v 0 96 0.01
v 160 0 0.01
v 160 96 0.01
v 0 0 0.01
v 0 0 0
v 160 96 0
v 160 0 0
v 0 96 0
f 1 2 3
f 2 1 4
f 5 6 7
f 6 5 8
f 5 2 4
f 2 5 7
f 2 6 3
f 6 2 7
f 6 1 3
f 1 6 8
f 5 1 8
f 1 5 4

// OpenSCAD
// file: ../common/library_function.scad
// 라이브러리, 검증된 것만 이곳에
use <MCAD/boxes.scad>
include	<constants.scad>

// 적정한 fn 값
function fnRound(radious) = $preview ? FN : floor(2 * PI * radious / 0.4) - floor(2 * PI * radious / 0.4) % 4;
//function fnRound(radious) = 2 * PI * radious / 0.4;

// z축 0로로
function set_z(v, z) = [v.x, v.y, z];

// 벡터 회전 계산
function rotate_vector(angle, vector) = rotatez_vector(angle[2], rotatey_vector(angle[1], rotatex_vector(angle[0], vector)));
// x축 기준 회전 벡터 회전 계산
function rotatex_vector(anglex, vector) = [
	vector[0],
	-vector[2] * sin(anglex) + vector[1] * cos(anglex),
	vector[2] * cos(anglex) + vector[1] * sin(anglex)
];
// y축 기준 회전 벡터 회전 계산
function rotatey_vector(angley, vector) = [
	vector[0] * cos(angley) + vector[2] * sin(angley),
	vector[1],
	-vector[0] * sin(angley) + vector[2] * cos(angley)
];

// z축 기준 회전 벡터 회전 계산
function rotatez_vector(anglez, vector) = [
	-vector[1] * sin(anglez) + vector[0] * cos(anglez),
	vector[1] * cos(anglez) + vector[0] * sin(anglez),
	vector[2]
];

//	숫자, 소수점 이하 몇자리
function strfix(number, count) =
	chr([for (cx = [0:
		len(search(".", str(number))) == 0
			? len(str(number)) - 1
			: (search(".", str(number))[0] + count) >= len(str(number))
				? len(str(number)) - 1
				: (search(".", str(number))[0] + count)
	]) ord(str(number)[cx])])
;

//	육면체에서 꼭지점들을 벡터로
function	vectors_from_cube(size) = [
	[0,			0,		0],
	[size.x,	0,		0],
	[size.x,	size.y,	0],
	[0,			size.y,	0],

	[0,			0,		size.z],
	[size.x,	0,		size.z],
	[size.x,	size.y,	size.z],
	[0,			size.y,	size.z]
];
// file: collect-default.scad
//use <part-01.scad>	// 화소가 있는 영역, activeArea
//use <part-02.scad>	//	주요 화면 부품. Display Panel, displayPanel
//use <part-03.scad>	//	디스플레이 패널에 붙어있는 커넥터, displayConnector
//use <part-04.scad>	//	패널 밑에 받치는 밑판
//use <part-05.scad>	//	디스플레이 패널을 덮는 위판, upperPanel
//use <part-06.scad>	//	waveshare epaper 7.3인치 제품. 그룹 of part1, part2, part3
//use <part-10.scad>	//	연결 부속들만 네 귀퉁이에 위치시킨 것
//use <part-13.scad>

//	DEFAULT값을 모아, 모아서
DEFAULT_COLLECTED = [
	// part01, 화소가 있는 영역, activeArea
	["active.area",								"화소가 있는 영역, activeArea"],
	["active.area.size",	[160.00, 96.00],	"크기, 화소가 있는 영역, sizeActiveArea"],

	//	part02, 주요 화면 부품. Display Panel, displayPanel
	["display.panel",								"주요 화면 부품. Display Panel, displayPanel"],
	["display.panel.size",	[170.20, 111.20, 0.91],	"크기, 화면 부품의 크기, sizeDisplayPanel"],
	["active.area.margin",	[5.10, 4.70],			"여백, 화소가 있는 영역, marginActiveArea"],

	//	디스플레이 패널에 붙어있는 커넥터, displayConnector, part03
	["display.connector",			"디스플레이 패널에 붙어있는 커넥터, displayConnector, part03"],
	["display.connector.size",		[25.50, 24.00, 0.1],			"크기, sizeDisplayConnector"],
	["display.connector.margin",	[72.35, 0, 0],					"디스플레이 패널로부터의 상대적인 위치,여백, marginDisplayConnector"],

	//	패널 밑에 받치는 밑판, underPanel
	["under.panel",									"패널 밑에 받치는 밑판, underPanel"],
	["under.panel.height",				2,			"밑판의 높이, heightUnderPanel"],
	["under.panel.hill.size",			[3, 3, 1],	"언덕의 크기, sizeUnderPanelHill"],
	["under.panel.corner.plane.radius",	3 / 4,		"모서리 대패의 반경, radiusUnderPanelCornerPlane"],
	["under.panel.rail",				[16, 16, 0],"밑판 최외곽 최소 너비 railUnderPanel"],
	["under.panel.hole",							"밑판 구멍"],
	["under.panel.hole.ratio",			0.5,		"밑판 구멍내는 비율, ratioUnderPanelHole"],
	["under.panel.hole.radius",			8,			"밑판 구멍내는 원의 크기, radiusUnderPanelHole"],
	["under.panel.size",							"계산된 크기. 다른 부품(패널)의 크기에 종속된다"],
	["under.panel.size.outter",			undef,		"계산된 전체 외경, sizeOutterUnderPanel"],
	["under.panel.size.inner",			undef,		"계산된 내경, sizeInnerUnderPanel"],

	["display.panel.margin",			[0.5, 0.5,  0.5],	"여백, 밑판과 화면 부품 사이의 여유 공간, marginDisplayPanel"],

	//	part05, 디스플레이 패널을 덮는 위판, upperPanel
	["upper.panel",					"디스플레이 패널을 덮는 위판, upperPanel"],
	["upper.panel.hight",	1,		"높이 of 디스플레이 패널을 덮는 위판, hightUpperPanel"],
	["upper.panel.radius",	1 / 4,	"모서리 굴곡의 반지름, radiusUpperPanel"],

	//	연결 부속들만 네 귀퉁이에 위치시킨 것
	["joint",													"연결 부속, joint"],
	["joint.size",		[0.8, 12, 3 - 0.4 - 0.1, 0.4, 0.4],		"연결 부속 크기 정의, sizeJoint"],
	["joint.margin",	[3, 8, 0],								"여백, 연결 부속의 모서리로부터의 위치, marginJoint"],

	//	프로토타입: 밑판 위판 귀퉁이 일부만 출력, prototype
	["prototype",							"프로토타입: 밑판 위판 귀퉁이 일부만 출력, prototype"],
	["prototype.joint.margin",	[32, 32],	"연결 부속을 들어내는 크기, marginPrototypeJoint"],

//	for (cx = default01()) cx,
//	for (cx = default02()) cx,
//	for (cx = default03()) cx,
//	for (cx = default04()) cx,
//	for (cx = default05()) cx,
//	for (cx = default06()) cx,
//	for (cx = default10()) cx,
//	for (cx = default13()) cx,

	["end", "끝"]
];
function default() = DEFAULT_COLLECTED;

module usage() {
	echo(str(parent_module(0), ".", parent_module(1), "(", DEFAULT_COLLECTED, ")"));
}

module main(command = 0) {
	echo(str("", parent_module(0), "(", command, ")"));

	if (command == 0) {
		usage();
	} else {
		echo("NOT SUPPORTED");
	}
}

main(is_undef(command) ? 0 : command);
// file: ../common/constants.scad
// 상수들 정의
// include 사용하시오
MAX = [220, 220, 250];
ZERO = [0, 0, 0];
HALF = [1/2, 1/2, 1/2];
ONE = [1, 1, 1];
BIG = [1024, 1024, 1024];
EPSILON = 0.01;
EPSILON2 = EPSILON * 2;
MINIMUM = 0.1;	//	0.1mm
NOZZLE = 0.4;	//	노즐 지름
OVERHANG_THRESHOLD = 30;
HR = "──────────────────────────────────";
DIGIT = "①②③④⑤⑥⑦⑧⑨⑩⑪⑫⑬⑭⑮⑯⑰⑱⑲⑳";
UPPER = "ⒶⒷⒸⒹⒺⒻⒼⒽⒾⒿⓀⓁⓂⓃⓄⓅⓆⓇⓈⓉⓊⓋⓌⓍⓎⓏ";
LOWER = "ⓐⓑⓒⓓⓔⓕⓖⓗⓘⓙⓚⓛⓜⓝⓞⓟⓠⓡⓢⓣⓤⓥⓦⓧⓨⓩ";

FN = $preview ? 16 : 360;

//	자원들
RADIUS_HOLE_NUT_25 = 3.4 / 2;	//	검은색 25mm 나사 너트 구멍 반지름
// main file
// 라이브러리, 검증된 것만 이곳에
include	<../common/constants.scad>
use	<../common/library_text.scad>
use	<common.scad>
use <collect-default.scad>

// 화소가 있는 영역, activeArea
ACTIVE_AREA_COLOR = [0.3, 0.3, 0.9, 0.9];
DEFAULT = default();

module epaper_part01(map = DEFAULT) {
	echo(str(parent_module(0), ".", parent_module(1), "(", map, ")"));

	sizeActiveArea = get(map, "active.area.size", DEFAULT);

	size = [sizeActiveArea.x, sizeActiveArea.y, EPSILON];
	fs = 2;	//	폰트 크기

	color(ACTIVE_AREA_COLOR)
	cube(size);
	
	translate([0, size.y - 8, size.z])
	notate([size.x, fs]);

	translate([size.x - 8, 0, size.z])
	notate([fs, size.y]);

	%translate([size.x / 2, size.y / 2, 0])
	linear_extrude(height = EPSILON) {
		text(str(parent_module(0), sizeActiveArea), font = "D2Coding", size = fs, halign = "center");
	}
}
module main() {
	epaper_part01();
}

main();
